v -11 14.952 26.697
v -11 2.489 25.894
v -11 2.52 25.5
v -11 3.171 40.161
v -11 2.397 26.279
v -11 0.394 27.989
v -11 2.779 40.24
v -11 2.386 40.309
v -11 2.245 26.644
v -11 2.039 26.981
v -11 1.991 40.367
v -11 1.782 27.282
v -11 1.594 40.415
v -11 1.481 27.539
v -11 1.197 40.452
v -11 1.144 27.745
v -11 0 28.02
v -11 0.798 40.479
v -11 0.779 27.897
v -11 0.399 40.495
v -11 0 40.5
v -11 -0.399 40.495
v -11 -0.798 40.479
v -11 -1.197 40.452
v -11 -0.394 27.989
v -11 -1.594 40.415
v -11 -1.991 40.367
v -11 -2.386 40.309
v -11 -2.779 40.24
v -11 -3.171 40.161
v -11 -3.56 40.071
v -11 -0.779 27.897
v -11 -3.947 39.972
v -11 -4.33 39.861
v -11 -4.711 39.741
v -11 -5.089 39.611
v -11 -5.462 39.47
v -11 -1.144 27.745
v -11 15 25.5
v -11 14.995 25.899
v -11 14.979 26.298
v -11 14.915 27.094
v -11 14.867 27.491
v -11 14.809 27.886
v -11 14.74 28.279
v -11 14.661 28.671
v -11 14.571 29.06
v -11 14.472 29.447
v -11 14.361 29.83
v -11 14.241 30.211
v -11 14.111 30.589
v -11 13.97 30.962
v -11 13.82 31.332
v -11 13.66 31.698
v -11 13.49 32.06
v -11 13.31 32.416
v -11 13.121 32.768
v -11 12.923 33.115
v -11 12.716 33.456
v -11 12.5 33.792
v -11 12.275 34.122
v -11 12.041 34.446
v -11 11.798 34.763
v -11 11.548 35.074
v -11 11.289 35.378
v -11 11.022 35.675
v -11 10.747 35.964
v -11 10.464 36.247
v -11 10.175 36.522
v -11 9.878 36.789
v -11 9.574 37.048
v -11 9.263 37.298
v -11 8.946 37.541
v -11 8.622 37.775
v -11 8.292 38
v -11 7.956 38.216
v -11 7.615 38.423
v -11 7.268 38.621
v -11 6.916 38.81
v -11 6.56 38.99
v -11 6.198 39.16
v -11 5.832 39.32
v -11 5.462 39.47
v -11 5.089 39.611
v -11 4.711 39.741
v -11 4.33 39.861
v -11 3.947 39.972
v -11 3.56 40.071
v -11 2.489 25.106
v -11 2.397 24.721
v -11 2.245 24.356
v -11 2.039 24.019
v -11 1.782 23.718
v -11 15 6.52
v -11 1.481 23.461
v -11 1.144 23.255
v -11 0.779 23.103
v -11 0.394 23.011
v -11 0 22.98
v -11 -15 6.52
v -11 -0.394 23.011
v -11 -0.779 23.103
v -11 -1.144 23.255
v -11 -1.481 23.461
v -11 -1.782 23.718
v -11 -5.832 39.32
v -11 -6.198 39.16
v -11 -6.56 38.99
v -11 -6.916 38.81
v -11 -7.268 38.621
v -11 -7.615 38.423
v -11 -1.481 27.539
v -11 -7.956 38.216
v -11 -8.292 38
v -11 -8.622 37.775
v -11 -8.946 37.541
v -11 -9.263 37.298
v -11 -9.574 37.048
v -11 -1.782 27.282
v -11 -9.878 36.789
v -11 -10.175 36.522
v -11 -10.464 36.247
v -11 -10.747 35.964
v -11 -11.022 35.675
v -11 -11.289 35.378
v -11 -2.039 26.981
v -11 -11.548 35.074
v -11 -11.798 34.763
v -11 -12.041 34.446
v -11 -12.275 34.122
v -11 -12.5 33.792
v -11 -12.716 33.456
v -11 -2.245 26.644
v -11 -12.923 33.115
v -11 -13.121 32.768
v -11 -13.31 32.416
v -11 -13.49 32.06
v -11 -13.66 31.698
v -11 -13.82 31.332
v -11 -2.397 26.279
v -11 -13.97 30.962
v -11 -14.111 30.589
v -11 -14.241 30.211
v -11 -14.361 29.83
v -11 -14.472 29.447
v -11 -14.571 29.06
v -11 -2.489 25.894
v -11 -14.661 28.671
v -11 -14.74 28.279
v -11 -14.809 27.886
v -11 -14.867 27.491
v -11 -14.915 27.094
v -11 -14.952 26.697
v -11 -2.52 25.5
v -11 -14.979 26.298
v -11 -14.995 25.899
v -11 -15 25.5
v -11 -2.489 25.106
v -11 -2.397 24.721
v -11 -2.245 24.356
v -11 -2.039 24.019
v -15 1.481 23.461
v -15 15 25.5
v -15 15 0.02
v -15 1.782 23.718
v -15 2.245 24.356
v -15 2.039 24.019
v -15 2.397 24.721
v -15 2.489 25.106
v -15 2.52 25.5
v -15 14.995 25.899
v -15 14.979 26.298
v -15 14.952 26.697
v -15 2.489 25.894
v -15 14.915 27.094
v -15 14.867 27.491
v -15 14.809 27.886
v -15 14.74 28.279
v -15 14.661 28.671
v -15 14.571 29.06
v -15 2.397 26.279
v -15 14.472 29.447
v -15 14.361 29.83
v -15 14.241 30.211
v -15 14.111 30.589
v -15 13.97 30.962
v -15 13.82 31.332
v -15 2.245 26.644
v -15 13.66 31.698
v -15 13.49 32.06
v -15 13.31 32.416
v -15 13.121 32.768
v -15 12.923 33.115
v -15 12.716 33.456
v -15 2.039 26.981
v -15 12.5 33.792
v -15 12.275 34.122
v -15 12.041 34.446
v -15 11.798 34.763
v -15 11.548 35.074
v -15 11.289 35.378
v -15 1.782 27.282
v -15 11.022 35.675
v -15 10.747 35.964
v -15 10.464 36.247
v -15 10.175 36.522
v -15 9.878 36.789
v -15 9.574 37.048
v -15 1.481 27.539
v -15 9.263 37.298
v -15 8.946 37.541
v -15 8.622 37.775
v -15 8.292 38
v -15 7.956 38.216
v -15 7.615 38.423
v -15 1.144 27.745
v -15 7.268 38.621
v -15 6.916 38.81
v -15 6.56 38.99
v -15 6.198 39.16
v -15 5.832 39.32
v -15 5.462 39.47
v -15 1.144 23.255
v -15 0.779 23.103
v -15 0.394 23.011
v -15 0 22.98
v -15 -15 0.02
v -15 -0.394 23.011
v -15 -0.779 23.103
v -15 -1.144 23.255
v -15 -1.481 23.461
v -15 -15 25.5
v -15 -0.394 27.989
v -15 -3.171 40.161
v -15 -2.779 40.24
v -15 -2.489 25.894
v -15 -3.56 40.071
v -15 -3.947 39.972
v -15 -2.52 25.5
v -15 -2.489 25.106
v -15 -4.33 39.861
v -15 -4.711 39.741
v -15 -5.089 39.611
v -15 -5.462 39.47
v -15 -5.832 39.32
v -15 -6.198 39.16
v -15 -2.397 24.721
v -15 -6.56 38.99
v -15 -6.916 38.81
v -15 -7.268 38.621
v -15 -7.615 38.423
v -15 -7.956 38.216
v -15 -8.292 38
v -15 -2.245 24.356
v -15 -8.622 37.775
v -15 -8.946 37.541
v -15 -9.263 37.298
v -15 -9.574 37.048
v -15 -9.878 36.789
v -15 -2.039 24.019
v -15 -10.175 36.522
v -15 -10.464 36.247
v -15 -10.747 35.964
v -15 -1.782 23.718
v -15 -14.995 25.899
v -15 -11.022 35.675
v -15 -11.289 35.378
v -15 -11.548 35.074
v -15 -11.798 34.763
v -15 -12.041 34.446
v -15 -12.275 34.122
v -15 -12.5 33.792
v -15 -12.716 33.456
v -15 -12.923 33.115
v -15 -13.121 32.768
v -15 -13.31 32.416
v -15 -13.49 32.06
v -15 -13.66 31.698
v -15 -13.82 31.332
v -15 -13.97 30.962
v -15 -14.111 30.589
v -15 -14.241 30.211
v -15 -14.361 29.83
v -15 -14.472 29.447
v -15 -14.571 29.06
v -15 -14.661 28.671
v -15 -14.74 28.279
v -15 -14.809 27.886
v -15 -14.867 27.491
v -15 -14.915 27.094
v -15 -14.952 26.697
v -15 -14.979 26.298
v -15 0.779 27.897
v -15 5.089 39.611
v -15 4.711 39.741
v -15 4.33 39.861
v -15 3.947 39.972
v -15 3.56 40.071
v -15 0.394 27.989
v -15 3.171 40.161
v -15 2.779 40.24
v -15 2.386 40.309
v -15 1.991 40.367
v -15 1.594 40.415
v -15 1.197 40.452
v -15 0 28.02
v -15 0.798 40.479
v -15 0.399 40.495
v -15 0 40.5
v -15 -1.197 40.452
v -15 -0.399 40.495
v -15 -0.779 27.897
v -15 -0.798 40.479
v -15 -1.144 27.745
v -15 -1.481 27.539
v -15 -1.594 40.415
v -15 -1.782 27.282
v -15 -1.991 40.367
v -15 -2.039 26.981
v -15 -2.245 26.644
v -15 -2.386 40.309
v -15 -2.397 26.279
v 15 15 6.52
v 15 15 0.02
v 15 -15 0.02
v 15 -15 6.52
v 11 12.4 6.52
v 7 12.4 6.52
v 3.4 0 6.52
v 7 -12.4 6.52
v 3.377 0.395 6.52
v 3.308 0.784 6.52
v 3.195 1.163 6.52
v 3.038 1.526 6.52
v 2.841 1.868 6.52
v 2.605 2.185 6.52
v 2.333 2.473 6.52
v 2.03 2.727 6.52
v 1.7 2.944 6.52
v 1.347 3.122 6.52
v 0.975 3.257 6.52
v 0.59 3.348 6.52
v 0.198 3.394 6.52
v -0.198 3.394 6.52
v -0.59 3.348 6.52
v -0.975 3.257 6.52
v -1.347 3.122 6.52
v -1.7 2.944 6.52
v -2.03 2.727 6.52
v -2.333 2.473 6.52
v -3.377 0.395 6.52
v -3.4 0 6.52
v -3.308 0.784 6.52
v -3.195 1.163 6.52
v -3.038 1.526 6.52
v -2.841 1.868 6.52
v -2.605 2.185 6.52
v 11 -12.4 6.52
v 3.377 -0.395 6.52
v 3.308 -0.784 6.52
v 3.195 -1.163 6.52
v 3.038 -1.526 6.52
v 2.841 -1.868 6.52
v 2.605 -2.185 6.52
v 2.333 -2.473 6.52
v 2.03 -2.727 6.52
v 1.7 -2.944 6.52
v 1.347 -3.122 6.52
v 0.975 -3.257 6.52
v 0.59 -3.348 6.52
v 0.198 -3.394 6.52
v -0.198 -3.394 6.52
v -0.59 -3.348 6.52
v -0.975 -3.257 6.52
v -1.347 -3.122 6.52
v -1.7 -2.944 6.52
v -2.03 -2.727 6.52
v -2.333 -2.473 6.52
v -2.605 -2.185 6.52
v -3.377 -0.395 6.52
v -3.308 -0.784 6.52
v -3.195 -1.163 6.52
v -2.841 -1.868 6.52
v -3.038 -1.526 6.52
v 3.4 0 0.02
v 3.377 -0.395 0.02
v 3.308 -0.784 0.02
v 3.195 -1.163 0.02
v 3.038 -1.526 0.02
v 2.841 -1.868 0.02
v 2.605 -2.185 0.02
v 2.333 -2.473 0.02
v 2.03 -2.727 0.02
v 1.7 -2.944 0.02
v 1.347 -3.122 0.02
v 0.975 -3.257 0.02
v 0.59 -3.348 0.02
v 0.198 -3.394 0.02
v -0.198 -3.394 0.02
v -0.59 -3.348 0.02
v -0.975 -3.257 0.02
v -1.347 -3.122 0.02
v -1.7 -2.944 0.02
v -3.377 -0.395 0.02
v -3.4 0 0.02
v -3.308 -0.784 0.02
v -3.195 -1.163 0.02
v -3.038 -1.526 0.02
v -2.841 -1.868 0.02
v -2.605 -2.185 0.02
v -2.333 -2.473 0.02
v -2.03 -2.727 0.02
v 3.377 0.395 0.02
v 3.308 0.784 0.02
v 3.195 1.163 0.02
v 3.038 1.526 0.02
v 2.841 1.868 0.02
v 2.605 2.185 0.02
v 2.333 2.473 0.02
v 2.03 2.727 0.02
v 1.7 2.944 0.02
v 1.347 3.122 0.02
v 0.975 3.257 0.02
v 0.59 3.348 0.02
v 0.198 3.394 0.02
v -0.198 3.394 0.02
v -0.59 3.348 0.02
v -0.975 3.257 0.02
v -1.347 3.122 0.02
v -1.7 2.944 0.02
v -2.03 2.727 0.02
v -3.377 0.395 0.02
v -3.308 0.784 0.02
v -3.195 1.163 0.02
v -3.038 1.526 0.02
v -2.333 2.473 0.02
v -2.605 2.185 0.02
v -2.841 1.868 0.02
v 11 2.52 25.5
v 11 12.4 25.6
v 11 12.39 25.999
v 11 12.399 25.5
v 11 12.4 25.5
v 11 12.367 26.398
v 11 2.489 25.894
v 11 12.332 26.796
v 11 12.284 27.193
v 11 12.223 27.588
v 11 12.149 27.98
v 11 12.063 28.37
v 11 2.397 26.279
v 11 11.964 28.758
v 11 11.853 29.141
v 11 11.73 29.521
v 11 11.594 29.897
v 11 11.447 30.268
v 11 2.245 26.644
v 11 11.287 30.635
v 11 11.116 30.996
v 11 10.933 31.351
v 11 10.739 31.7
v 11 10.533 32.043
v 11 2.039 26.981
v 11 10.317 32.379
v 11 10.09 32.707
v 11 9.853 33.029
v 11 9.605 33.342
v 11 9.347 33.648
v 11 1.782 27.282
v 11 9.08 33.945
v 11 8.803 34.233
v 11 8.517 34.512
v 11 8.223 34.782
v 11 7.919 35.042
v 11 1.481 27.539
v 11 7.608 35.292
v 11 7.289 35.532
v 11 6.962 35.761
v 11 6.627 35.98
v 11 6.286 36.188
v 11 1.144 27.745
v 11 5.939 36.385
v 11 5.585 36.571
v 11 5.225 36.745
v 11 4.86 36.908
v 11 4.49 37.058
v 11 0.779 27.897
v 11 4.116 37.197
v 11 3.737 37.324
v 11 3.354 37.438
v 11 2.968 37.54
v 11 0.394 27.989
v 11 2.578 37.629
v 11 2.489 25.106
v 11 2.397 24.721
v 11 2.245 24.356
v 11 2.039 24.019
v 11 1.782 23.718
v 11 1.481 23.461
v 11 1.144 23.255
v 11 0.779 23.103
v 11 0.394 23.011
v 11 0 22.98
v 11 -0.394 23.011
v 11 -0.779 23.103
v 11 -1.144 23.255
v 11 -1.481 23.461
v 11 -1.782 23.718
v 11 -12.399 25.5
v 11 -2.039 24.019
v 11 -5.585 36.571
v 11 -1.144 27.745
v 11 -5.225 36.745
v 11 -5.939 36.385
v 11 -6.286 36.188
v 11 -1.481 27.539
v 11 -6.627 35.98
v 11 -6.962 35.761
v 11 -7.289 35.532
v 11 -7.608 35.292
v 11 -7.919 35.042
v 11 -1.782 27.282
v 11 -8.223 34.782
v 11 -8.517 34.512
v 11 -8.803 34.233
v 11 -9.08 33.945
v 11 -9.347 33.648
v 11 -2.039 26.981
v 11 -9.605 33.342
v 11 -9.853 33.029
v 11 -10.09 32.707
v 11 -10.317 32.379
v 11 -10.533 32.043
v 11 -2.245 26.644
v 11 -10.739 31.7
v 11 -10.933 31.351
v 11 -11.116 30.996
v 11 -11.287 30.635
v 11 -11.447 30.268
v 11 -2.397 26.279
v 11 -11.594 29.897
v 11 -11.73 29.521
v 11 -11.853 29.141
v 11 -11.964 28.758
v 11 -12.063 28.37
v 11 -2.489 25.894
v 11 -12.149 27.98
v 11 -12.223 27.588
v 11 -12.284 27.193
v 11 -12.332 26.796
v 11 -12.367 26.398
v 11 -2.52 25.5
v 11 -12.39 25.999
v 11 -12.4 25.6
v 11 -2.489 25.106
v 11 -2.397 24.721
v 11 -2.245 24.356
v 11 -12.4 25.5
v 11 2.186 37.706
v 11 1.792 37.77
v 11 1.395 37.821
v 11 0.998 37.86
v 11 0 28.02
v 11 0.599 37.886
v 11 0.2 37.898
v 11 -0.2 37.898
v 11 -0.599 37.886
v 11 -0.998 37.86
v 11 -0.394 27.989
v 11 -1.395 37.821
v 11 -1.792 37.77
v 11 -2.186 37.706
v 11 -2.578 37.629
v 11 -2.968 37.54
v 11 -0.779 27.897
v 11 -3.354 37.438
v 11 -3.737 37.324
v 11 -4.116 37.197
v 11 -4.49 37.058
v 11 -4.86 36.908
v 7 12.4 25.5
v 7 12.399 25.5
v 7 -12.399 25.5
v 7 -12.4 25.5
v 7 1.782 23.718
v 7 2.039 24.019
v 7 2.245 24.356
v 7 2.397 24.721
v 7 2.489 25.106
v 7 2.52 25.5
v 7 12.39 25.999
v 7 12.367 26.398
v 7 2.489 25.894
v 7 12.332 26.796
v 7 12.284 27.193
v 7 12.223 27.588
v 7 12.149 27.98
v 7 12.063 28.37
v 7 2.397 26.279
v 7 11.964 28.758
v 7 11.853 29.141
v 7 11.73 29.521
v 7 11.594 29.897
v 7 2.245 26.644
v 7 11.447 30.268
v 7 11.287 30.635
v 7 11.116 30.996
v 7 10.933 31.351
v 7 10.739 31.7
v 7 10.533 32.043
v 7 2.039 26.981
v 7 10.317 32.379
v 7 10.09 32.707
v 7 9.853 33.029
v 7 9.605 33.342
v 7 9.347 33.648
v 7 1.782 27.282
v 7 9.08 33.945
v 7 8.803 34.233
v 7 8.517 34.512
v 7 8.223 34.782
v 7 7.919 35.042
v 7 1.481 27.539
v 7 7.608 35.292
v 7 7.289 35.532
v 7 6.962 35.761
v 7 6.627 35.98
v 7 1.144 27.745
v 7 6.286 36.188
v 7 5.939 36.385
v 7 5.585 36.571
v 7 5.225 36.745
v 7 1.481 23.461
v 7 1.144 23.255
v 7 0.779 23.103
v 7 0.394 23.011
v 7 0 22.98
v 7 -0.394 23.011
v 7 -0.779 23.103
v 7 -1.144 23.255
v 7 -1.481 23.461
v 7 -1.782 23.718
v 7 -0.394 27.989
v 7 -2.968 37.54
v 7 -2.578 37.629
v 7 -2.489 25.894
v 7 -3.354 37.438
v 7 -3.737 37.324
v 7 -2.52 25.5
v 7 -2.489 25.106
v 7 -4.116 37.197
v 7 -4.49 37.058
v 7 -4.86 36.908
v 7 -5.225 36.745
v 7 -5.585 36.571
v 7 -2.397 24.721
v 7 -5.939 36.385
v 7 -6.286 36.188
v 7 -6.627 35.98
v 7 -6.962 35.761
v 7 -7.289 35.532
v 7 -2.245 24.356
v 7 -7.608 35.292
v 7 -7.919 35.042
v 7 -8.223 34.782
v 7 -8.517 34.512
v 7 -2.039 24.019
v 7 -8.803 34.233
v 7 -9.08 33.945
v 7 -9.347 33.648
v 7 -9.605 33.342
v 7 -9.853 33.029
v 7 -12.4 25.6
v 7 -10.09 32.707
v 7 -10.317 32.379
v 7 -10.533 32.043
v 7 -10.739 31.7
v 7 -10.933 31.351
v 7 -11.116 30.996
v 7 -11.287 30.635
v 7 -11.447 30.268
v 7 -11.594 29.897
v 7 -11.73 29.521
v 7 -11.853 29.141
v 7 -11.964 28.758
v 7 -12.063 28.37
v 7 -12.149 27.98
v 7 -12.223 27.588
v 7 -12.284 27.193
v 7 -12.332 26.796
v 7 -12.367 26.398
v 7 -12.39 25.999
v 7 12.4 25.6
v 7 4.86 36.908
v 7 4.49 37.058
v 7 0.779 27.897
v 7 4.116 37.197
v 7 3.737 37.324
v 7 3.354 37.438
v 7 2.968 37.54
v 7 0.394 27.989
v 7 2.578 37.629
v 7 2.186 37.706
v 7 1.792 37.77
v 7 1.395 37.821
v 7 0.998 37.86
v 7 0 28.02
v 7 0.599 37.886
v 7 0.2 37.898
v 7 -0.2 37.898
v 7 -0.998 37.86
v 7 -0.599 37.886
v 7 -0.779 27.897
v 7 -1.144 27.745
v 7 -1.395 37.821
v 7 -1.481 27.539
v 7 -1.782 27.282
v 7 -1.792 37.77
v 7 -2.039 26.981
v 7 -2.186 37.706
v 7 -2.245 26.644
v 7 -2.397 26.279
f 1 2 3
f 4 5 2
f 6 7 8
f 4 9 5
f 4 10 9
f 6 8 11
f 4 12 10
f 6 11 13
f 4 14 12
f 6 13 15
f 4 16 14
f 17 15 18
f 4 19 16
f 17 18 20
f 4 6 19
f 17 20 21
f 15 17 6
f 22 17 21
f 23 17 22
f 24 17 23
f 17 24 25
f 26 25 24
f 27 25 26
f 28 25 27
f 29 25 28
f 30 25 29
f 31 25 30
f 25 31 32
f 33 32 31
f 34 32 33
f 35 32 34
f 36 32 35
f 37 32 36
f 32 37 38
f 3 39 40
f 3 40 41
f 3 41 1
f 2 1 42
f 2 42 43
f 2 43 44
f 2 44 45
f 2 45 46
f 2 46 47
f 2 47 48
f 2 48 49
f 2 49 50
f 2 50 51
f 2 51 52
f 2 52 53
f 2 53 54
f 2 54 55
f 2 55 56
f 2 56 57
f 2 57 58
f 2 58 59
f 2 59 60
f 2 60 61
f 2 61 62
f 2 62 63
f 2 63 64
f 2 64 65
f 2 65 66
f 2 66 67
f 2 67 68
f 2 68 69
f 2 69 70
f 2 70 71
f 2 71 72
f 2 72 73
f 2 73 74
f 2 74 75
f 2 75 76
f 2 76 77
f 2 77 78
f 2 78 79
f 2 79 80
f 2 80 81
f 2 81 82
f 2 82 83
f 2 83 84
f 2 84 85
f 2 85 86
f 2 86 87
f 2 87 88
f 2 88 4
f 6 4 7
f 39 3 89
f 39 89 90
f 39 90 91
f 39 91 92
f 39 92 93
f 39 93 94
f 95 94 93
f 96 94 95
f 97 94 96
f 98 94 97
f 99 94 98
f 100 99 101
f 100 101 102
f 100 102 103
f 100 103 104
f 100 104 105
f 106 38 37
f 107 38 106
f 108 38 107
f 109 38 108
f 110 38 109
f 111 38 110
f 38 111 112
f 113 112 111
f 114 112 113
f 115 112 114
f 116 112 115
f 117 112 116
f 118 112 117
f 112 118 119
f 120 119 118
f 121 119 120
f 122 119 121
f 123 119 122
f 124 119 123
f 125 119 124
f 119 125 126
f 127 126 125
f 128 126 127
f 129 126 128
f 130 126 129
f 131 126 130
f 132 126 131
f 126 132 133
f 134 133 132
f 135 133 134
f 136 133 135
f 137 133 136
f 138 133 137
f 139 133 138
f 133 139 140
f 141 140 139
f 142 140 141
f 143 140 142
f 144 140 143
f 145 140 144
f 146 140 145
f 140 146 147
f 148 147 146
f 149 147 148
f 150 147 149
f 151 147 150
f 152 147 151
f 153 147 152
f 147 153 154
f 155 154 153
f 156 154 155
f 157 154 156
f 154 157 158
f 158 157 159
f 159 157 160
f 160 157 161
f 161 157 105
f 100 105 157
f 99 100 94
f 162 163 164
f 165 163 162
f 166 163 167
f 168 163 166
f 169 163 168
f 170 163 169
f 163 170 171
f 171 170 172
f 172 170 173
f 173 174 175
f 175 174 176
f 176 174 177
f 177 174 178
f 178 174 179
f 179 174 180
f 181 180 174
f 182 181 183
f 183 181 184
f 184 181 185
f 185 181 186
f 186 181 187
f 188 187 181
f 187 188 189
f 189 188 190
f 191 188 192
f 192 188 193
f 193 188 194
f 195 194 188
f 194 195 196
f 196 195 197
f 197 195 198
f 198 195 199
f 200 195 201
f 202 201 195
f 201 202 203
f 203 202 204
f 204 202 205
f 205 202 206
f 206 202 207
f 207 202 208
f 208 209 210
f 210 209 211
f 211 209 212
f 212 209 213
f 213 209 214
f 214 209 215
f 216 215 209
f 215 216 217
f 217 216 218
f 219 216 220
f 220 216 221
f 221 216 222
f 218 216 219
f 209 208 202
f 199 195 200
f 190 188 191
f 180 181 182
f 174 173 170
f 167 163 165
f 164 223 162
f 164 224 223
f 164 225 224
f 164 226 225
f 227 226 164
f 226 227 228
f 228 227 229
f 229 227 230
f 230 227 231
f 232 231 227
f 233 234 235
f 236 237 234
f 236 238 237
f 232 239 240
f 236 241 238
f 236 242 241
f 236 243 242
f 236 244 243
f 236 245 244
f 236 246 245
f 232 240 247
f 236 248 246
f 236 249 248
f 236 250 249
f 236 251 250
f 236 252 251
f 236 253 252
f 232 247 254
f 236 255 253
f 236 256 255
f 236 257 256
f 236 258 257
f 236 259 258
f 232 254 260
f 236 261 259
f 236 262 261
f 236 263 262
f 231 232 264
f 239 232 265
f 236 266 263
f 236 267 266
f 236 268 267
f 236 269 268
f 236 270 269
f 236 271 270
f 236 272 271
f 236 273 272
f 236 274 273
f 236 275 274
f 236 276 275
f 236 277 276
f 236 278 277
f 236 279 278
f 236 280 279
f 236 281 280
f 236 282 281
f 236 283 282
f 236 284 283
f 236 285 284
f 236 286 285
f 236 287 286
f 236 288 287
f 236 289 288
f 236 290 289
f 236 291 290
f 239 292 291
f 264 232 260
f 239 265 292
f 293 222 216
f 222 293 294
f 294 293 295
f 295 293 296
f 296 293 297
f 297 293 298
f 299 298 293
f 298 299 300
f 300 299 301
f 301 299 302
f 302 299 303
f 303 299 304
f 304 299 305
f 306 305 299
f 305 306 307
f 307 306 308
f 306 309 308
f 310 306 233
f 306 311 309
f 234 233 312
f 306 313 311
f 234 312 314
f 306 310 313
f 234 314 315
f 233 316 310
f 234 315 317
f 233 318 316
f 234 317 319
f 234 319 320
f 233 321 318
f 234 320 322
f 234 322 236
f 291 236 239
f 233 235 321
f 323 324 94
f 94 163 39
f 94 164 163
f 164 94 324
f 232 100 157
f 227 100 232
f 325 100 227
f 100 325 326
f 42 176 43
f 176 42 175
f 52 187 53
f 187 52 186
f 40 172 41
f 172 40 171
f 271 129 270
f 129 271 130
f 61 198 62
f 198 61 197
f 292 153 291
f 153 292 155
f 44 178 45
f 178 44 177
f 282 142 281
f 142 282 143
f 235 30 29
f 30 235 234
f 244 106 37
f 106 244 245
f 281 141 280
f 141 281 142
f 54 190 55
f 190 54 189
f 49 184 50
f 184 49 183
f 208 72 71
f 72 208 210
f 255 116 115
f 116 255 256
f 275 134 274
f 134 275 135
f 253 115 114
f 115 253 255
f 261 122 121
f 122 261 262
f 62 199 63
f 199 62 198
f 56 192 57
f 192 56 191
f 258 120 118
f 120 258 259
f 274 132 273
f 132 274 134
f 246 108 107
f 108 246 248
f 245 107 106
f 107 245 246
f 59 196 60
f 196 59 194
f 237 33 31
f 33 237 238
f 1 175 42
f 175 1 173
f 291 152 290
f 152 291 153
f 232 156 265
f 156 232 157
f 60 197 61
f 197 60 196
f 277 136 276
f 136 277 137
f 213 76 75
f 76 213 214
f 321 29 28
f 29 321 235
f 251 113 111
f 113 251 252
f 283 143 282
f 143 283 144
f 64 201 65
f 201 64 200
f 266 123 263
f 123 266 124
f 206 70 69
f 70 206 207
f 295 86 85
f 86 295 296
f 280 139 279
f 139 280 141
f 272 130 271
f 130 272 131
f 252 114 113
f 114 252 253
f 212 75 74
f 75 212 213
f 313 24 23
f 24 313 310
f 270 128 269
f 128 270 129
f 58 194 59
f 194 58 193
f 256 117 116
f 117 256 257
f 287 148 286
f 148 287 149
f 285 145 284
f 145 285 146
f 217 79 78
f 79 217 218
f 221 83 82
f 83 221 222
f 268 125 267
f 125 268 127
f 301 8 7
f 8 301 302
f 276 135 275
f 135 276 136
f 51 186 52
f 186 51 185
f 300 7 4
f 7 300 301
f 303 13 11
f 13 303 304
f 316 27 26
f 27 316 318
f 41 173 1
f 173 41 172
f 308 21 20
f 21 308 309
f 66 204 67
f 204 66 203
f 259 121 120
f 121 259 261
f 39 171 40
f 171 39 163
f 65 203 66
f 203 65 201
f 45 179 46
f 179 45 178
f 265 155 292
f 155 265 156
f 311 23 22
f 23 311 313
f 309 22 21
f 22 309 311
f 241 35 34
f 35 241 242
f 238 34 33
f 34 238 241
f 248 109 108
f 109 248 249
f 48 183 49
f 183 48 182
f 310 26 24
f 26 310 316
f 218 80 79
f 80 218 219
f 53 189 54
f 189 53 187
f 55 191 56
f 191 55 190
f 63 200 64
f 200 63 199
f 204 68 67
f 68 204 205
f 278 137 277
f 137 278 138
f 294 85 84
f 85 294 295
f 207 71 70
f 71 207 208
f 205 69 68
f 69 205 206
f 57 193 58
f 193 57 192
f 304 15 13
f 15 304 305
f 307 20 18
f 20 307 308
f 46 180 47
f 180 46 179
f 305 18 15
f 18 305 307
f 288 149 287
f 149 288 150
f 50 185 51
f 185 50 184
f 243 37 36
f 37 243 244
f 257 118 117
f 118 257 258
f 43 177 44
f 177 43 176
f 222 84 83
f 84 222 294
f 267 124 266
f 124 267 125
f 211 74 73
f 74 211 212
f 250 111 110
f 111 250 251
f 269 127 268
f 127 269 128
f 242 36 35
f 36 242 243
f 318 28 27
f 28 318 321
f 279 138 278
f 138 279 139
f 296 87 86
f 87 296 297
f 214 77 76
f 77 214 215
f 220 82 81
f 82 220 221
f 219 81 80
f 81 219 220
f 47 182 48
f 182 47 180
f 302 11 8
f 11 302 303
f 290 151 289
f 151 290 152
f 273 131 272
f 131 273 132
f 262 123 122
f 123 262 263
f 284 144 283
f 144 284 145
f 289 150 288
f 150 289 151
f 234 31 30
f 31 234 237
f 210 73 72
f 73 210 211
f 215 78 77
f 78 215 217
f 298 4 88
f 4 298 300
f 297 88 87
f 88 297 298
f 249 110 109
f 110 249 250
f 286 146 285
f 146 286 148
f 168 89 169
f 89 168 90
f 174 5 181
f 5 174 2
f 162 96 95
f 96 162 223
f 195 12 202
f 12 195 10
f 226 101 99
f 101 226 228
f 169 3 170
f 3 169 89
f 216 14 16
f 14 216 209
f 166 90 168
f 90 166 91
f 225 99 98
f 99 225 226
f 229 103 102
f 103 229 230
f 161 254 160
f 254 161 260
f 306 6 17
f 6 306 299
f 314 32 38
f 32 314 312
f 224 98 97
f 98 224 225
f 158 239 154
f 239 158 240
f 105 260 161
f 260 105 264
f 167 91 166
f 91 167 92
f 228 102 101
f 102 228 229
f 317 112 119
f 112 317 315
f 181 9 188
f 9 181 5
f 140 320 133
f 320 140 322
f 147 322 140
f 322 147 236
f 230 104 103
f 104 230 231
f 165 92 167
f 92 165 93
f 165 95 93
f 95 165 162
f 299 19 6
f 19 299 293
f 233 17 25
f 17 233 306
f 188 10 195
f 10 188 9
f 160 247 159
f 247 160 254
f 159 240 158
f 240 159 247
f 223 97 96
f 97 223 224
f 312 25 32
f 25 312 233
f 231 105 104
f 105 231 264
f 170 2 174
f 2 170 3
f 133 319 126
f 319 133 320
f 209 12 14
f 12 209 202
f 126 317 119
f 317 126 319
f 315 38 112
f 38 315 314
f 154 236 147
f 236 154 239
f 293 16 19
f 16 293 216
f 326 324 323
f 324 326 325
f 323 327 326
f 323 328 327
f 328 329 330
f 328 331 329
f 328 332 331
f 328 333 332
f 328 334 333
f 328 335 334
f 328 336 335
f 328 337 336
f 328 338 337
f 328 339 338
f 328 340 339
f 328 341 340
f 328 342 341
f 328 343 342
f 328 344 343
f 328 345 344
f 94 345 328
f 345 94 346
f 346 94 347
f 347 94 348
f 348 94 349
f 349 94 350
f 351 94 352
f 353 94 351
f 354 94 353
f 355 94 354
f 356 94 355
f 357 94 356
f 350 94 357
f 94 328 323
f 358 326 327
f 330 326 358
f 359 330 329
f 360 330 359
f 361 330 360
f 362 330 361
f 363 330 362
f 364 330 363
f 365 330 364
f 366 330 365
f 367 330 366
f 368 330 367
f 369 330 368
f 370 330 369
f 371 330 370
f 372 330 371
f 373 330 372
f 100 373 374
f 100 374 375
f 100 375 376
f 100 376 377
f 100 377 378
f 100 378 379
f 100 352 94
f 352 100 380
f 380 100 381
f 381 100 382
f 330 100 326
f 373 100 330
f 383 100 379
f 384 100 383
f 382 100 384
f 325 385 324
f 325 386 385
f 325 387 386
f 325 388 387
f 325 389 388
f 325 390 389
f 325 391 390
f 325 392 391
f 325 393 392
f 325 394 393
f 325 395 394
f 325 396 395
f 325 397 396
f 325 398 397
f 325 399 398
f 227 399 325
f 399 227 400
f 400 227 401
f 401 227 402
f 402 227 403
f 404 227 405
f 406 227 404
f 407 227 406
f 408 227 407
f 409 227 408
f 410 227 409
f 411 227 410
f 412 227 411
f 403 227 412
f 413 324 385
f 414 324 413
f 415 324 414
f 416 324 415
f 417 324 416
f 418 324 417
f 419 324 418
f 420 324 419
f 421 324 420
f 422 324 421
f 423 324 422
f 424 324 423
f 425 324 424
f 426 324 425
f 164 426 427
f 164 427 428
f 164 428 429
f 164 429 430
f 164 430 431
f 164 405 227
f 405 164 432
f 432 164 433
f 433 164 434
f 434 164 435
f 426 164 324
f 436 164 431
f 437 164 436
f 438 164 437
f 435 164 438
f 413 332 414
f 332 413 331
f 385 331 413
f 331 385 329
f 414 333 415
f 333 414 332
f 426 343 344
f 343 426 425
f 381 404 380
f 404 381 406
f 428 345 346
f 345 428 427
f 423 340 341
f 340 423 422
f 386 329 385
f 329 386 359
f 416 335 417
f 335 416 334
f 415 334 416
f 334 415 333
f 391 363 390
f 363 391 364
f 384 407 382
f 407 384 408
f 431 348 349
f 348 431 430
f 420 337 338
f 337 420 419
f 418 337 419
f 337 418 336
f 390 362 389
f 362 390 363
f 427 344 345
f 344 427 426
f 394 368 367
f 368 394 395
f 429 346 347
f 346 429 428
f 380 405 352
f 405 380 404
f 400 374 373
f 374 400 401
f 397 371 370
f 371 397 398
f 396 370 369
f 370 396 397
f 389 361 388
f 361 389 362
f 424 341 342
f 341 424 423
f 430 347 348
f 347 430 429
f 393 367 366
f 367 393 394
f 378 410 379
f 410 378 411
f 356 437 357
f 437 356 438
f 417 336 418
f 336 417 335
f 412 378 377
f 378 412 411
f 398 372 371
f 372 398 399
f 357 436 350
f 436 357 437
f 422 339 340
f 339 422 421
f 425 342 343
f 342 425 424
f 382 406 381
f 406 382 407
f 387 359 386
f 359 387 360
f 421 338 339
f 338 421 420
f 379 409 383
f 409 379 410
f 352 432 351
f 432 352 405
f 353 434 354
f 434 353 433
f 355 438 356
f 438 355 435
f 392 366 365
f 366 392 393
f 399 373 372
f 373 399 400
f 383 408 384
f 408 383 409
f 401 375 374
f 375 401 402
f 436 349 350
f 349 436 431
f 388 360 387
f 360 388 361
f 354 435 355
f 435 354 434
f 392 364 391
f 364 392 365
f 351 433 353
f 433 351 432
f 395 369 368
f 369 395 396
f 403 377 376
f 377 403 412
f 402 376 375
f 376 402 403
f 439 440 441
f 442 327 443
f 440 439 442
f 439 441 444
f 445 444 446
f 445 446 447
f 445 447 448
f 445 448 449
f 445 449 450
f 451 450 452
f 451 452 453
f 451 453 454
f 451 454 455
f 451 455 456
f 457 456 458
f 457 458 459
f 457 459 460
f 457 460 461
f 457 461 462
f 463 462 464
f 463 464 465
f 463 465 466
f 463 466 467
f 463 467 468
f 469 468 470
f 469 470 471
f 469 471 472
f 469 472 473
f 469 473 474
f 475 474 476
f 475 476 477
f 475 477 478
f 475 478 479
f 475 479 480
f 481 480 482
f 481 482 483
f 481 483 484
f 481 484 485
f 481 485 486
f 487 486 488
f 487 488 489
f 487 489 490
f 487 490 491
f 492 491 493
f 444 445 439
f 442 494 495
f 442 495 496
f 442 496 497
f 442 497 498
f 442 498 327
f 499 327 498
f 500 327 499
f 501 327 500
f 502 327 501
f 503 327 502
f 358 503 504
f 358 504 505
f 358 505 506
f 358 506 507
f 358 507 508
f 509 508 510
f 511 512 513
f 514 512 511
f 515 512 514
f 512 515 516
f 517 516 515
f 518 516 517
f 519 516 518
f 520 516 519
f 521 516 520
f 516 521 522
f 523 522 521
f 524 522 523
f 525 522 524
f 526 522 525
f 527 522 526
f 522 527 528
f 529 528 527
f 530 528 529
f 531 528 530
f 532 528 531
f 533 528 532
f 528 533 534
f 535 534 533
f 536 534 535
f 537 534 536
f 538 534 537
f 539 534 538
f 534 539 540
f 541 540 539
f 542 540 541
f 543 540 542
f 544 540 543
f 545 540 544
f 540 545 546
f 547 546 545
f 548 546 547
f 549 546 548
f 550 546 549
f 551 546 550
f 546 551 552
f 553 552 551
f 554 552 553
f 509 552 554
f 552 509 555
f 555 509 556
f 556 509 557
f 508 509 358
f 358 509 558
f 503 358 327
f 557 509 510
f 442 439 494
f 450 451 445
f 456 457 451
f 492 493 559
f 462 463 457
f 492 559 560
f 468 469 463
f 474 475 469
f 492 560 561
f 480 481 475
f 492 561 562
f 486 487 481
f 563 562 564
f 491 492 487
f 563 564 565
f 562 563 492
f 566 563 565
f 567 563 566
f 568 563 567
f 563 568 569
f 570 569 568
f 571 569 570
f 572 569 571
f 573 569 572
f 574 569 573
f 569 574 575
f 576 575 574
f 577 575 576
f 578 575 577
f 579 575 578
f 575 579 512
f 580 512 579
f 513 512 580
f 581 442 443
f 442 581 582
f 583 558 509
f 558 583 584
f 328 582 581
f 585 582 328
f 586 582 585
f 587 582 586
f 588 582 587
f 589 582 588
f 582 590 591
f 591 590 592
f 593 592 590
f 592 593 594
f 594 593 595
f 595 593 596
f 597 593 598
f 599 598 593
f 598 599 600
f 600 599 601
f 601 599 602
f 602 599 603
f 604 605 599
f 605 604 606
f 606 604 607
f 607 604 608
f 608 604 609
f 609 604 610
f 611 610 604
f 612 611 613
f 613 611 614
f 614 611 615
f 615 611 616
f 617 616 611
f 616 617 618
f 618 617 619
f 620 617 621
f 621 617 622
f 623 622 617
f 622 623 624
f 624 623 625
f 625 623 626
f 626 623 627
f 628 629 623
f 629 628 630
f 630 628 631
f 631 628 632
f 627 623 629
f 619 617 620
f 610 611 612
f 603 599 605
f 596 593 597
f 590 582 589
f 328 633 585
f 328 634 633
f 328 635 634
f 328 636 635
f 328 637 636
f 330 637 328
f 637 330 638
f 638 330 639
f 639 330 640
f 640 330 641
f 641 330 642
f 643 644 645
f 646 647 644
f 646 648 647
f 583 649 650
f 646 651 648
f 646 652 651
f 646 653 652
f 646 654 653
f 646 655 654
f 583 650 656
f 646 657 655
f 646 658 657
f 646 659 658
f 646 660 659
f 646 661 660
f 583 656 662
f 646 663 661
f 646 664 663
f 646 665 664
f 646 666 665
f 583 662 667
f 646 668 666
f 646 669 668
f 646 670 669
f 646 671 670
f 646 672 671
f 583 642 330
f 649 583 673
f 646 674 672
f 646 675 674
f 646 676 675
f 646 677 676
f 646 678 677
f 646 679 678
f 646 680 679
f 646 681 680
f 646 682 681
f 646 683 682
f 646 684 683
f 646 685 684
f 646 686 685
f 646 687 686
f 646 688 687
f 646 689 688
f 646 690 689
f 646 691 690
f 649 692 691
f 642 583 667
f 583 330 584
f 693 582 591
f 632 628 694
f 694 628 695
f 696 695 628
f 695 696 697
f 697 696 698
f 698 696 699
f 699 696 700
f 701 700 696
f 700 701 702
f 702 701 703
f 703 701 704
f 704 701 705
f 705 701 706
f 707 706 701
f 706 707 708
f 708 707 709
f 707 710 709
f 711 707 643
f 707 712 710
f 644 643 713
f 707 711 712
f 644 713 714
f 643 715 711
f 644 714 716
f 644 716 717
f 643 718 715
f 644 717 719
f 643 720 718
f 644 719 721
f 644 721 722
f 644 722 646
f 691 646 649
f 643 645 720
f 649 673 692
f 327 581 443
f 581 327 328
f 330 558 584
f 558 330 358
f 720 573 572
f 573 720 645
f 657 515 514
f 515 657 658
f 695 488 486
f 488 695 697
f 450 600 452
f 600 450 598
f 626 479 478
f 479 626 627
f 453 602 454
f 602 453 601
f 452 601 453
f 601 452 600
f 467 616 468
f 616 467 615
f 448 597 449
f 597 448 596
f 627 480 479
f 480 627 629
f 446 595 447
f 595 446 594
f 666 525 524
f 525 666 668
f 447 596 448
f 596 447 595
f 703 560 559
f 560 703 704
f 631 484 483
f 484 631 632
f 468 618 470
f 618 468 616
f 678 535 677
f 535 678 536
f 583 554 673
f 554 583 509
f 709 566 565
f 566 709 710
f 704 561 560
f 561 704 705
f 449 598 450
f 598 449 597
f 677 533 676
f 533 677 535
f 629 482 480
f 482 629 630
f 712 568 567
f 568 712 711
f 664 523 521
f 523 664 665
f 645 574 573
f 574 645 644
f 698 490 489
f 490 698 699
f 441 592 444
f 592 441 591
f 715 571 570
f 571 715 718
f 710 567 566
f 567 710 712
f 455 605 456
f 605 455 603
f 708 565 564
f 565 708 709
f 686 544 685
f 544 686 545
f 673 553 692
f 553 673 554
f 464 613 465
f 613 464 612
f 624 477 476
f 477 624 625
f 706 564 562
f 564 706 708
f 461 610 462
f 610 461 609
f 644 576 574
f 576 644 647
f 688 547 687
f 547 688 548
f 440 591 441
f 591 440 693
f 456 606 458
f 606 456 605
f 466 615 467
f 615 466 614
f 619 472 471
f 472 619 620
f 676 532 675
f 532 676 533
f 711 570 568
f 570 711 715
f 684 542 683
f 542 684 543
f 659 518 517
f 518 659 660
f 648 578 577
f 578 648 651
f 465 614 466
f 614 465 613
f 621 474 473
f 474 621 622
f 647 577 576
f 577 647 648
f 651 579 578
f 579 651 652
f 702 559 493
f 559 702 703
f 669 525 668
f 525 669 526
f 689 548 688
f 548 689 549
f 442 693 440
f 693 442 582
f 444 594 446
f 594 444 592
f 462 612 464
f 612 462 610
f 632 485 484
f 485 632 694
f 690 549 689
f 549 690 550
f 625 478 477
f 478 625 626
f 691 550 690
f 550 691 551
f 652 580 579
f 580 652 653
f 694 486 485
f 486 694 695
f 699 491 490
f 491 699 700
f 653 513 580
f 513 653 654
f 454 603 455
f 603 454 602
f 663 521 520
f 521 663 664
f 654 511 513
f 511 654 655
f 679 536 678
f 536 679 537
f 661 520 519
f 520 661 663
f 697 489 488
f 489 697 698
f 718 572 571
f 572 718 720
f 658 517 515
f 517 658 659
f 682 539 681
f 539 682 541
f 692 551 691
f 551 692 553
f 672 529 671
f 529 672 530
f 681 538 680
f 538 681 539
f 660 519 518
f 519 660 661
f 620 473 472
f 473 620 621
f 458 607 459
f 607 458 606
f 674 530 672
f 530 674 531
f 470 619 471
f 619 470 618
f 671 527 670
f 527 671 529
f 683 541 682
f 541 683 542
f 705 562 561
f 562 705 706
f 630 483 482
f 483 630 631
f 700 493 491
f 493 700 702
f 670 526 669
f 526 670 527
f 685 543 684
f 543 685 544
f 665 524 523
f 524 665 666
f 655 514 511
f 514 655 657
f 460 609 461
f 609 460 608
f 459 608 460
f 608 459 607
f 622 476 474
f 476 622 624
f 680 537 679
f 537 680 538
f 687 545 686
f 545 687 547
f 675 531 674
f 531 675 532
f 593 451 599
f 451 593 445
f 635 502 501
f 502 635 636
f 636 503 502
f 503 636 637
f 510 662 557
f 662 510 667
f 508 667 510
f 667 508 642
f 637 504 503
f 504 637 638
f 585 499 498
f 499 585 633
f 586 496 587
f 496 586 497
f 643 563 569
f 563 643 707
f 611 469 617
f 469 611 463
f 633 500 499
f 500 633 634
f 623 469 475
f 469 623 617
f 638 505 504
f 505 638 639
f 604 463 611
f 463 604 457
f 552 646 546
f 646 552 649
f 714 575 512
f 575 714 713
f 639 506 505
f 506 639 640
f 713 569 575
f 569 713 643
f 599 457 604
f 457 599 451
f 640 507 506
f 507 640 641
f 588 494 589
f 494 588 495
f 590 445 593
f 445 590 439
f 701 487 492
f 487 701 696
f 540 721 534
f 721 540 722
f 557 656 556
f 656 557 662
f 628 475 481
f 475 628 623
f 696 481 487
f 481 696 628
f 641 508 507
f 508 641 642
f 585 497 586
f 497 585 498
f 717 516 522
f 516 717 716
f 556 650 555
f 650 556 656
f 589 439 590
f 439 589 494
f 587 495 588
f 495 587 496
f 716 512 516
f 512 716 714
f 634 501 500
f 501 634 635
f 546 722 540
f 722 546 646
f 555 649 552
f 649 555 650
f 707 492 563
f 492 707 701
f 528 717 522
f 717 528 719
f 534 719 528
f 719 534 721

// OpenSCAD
$fa = 1;
$fs = 0.4;

translate([-(15-4/2),0,19/2+6.5])

difference(){
cube([4,30,19],center=true);

translate([0,0,19/2])
rotate([0,90,0])
cylinder(h=4+0.001,r=5.04/2,center=true);

}



translate([-(15-4/2),0,19+6.5])
rotate([0,90,0])
difference(){
cylinder(h=4,r=15,center=true);
cylinder(h=4+0.001,r=5.04/2,center=true);
}

translate([0,0,6.5/2+0.02])
difference(){
color([1,0,0])cube([30,30,6.5],center=true);
cylinder(h=6.6,r=6.8/2,center=true);
}

translate([15-4-4/2,0,19/2+6.5])
difference(){
cube([4,24.8,19],center=true);

translate([0,0,19/2])
rotate([0,90,0])
    cylinder(h=4+0.001,r=5.04/2,center=true);
}



translate([(15-4/2-4),0,19+6.5])
rotate([0,90,0])

difference(){
cylinder(h=4,r=12.4,center=true);
cylinder(h=4+0.001,r=5.04/2,center=true);
}
